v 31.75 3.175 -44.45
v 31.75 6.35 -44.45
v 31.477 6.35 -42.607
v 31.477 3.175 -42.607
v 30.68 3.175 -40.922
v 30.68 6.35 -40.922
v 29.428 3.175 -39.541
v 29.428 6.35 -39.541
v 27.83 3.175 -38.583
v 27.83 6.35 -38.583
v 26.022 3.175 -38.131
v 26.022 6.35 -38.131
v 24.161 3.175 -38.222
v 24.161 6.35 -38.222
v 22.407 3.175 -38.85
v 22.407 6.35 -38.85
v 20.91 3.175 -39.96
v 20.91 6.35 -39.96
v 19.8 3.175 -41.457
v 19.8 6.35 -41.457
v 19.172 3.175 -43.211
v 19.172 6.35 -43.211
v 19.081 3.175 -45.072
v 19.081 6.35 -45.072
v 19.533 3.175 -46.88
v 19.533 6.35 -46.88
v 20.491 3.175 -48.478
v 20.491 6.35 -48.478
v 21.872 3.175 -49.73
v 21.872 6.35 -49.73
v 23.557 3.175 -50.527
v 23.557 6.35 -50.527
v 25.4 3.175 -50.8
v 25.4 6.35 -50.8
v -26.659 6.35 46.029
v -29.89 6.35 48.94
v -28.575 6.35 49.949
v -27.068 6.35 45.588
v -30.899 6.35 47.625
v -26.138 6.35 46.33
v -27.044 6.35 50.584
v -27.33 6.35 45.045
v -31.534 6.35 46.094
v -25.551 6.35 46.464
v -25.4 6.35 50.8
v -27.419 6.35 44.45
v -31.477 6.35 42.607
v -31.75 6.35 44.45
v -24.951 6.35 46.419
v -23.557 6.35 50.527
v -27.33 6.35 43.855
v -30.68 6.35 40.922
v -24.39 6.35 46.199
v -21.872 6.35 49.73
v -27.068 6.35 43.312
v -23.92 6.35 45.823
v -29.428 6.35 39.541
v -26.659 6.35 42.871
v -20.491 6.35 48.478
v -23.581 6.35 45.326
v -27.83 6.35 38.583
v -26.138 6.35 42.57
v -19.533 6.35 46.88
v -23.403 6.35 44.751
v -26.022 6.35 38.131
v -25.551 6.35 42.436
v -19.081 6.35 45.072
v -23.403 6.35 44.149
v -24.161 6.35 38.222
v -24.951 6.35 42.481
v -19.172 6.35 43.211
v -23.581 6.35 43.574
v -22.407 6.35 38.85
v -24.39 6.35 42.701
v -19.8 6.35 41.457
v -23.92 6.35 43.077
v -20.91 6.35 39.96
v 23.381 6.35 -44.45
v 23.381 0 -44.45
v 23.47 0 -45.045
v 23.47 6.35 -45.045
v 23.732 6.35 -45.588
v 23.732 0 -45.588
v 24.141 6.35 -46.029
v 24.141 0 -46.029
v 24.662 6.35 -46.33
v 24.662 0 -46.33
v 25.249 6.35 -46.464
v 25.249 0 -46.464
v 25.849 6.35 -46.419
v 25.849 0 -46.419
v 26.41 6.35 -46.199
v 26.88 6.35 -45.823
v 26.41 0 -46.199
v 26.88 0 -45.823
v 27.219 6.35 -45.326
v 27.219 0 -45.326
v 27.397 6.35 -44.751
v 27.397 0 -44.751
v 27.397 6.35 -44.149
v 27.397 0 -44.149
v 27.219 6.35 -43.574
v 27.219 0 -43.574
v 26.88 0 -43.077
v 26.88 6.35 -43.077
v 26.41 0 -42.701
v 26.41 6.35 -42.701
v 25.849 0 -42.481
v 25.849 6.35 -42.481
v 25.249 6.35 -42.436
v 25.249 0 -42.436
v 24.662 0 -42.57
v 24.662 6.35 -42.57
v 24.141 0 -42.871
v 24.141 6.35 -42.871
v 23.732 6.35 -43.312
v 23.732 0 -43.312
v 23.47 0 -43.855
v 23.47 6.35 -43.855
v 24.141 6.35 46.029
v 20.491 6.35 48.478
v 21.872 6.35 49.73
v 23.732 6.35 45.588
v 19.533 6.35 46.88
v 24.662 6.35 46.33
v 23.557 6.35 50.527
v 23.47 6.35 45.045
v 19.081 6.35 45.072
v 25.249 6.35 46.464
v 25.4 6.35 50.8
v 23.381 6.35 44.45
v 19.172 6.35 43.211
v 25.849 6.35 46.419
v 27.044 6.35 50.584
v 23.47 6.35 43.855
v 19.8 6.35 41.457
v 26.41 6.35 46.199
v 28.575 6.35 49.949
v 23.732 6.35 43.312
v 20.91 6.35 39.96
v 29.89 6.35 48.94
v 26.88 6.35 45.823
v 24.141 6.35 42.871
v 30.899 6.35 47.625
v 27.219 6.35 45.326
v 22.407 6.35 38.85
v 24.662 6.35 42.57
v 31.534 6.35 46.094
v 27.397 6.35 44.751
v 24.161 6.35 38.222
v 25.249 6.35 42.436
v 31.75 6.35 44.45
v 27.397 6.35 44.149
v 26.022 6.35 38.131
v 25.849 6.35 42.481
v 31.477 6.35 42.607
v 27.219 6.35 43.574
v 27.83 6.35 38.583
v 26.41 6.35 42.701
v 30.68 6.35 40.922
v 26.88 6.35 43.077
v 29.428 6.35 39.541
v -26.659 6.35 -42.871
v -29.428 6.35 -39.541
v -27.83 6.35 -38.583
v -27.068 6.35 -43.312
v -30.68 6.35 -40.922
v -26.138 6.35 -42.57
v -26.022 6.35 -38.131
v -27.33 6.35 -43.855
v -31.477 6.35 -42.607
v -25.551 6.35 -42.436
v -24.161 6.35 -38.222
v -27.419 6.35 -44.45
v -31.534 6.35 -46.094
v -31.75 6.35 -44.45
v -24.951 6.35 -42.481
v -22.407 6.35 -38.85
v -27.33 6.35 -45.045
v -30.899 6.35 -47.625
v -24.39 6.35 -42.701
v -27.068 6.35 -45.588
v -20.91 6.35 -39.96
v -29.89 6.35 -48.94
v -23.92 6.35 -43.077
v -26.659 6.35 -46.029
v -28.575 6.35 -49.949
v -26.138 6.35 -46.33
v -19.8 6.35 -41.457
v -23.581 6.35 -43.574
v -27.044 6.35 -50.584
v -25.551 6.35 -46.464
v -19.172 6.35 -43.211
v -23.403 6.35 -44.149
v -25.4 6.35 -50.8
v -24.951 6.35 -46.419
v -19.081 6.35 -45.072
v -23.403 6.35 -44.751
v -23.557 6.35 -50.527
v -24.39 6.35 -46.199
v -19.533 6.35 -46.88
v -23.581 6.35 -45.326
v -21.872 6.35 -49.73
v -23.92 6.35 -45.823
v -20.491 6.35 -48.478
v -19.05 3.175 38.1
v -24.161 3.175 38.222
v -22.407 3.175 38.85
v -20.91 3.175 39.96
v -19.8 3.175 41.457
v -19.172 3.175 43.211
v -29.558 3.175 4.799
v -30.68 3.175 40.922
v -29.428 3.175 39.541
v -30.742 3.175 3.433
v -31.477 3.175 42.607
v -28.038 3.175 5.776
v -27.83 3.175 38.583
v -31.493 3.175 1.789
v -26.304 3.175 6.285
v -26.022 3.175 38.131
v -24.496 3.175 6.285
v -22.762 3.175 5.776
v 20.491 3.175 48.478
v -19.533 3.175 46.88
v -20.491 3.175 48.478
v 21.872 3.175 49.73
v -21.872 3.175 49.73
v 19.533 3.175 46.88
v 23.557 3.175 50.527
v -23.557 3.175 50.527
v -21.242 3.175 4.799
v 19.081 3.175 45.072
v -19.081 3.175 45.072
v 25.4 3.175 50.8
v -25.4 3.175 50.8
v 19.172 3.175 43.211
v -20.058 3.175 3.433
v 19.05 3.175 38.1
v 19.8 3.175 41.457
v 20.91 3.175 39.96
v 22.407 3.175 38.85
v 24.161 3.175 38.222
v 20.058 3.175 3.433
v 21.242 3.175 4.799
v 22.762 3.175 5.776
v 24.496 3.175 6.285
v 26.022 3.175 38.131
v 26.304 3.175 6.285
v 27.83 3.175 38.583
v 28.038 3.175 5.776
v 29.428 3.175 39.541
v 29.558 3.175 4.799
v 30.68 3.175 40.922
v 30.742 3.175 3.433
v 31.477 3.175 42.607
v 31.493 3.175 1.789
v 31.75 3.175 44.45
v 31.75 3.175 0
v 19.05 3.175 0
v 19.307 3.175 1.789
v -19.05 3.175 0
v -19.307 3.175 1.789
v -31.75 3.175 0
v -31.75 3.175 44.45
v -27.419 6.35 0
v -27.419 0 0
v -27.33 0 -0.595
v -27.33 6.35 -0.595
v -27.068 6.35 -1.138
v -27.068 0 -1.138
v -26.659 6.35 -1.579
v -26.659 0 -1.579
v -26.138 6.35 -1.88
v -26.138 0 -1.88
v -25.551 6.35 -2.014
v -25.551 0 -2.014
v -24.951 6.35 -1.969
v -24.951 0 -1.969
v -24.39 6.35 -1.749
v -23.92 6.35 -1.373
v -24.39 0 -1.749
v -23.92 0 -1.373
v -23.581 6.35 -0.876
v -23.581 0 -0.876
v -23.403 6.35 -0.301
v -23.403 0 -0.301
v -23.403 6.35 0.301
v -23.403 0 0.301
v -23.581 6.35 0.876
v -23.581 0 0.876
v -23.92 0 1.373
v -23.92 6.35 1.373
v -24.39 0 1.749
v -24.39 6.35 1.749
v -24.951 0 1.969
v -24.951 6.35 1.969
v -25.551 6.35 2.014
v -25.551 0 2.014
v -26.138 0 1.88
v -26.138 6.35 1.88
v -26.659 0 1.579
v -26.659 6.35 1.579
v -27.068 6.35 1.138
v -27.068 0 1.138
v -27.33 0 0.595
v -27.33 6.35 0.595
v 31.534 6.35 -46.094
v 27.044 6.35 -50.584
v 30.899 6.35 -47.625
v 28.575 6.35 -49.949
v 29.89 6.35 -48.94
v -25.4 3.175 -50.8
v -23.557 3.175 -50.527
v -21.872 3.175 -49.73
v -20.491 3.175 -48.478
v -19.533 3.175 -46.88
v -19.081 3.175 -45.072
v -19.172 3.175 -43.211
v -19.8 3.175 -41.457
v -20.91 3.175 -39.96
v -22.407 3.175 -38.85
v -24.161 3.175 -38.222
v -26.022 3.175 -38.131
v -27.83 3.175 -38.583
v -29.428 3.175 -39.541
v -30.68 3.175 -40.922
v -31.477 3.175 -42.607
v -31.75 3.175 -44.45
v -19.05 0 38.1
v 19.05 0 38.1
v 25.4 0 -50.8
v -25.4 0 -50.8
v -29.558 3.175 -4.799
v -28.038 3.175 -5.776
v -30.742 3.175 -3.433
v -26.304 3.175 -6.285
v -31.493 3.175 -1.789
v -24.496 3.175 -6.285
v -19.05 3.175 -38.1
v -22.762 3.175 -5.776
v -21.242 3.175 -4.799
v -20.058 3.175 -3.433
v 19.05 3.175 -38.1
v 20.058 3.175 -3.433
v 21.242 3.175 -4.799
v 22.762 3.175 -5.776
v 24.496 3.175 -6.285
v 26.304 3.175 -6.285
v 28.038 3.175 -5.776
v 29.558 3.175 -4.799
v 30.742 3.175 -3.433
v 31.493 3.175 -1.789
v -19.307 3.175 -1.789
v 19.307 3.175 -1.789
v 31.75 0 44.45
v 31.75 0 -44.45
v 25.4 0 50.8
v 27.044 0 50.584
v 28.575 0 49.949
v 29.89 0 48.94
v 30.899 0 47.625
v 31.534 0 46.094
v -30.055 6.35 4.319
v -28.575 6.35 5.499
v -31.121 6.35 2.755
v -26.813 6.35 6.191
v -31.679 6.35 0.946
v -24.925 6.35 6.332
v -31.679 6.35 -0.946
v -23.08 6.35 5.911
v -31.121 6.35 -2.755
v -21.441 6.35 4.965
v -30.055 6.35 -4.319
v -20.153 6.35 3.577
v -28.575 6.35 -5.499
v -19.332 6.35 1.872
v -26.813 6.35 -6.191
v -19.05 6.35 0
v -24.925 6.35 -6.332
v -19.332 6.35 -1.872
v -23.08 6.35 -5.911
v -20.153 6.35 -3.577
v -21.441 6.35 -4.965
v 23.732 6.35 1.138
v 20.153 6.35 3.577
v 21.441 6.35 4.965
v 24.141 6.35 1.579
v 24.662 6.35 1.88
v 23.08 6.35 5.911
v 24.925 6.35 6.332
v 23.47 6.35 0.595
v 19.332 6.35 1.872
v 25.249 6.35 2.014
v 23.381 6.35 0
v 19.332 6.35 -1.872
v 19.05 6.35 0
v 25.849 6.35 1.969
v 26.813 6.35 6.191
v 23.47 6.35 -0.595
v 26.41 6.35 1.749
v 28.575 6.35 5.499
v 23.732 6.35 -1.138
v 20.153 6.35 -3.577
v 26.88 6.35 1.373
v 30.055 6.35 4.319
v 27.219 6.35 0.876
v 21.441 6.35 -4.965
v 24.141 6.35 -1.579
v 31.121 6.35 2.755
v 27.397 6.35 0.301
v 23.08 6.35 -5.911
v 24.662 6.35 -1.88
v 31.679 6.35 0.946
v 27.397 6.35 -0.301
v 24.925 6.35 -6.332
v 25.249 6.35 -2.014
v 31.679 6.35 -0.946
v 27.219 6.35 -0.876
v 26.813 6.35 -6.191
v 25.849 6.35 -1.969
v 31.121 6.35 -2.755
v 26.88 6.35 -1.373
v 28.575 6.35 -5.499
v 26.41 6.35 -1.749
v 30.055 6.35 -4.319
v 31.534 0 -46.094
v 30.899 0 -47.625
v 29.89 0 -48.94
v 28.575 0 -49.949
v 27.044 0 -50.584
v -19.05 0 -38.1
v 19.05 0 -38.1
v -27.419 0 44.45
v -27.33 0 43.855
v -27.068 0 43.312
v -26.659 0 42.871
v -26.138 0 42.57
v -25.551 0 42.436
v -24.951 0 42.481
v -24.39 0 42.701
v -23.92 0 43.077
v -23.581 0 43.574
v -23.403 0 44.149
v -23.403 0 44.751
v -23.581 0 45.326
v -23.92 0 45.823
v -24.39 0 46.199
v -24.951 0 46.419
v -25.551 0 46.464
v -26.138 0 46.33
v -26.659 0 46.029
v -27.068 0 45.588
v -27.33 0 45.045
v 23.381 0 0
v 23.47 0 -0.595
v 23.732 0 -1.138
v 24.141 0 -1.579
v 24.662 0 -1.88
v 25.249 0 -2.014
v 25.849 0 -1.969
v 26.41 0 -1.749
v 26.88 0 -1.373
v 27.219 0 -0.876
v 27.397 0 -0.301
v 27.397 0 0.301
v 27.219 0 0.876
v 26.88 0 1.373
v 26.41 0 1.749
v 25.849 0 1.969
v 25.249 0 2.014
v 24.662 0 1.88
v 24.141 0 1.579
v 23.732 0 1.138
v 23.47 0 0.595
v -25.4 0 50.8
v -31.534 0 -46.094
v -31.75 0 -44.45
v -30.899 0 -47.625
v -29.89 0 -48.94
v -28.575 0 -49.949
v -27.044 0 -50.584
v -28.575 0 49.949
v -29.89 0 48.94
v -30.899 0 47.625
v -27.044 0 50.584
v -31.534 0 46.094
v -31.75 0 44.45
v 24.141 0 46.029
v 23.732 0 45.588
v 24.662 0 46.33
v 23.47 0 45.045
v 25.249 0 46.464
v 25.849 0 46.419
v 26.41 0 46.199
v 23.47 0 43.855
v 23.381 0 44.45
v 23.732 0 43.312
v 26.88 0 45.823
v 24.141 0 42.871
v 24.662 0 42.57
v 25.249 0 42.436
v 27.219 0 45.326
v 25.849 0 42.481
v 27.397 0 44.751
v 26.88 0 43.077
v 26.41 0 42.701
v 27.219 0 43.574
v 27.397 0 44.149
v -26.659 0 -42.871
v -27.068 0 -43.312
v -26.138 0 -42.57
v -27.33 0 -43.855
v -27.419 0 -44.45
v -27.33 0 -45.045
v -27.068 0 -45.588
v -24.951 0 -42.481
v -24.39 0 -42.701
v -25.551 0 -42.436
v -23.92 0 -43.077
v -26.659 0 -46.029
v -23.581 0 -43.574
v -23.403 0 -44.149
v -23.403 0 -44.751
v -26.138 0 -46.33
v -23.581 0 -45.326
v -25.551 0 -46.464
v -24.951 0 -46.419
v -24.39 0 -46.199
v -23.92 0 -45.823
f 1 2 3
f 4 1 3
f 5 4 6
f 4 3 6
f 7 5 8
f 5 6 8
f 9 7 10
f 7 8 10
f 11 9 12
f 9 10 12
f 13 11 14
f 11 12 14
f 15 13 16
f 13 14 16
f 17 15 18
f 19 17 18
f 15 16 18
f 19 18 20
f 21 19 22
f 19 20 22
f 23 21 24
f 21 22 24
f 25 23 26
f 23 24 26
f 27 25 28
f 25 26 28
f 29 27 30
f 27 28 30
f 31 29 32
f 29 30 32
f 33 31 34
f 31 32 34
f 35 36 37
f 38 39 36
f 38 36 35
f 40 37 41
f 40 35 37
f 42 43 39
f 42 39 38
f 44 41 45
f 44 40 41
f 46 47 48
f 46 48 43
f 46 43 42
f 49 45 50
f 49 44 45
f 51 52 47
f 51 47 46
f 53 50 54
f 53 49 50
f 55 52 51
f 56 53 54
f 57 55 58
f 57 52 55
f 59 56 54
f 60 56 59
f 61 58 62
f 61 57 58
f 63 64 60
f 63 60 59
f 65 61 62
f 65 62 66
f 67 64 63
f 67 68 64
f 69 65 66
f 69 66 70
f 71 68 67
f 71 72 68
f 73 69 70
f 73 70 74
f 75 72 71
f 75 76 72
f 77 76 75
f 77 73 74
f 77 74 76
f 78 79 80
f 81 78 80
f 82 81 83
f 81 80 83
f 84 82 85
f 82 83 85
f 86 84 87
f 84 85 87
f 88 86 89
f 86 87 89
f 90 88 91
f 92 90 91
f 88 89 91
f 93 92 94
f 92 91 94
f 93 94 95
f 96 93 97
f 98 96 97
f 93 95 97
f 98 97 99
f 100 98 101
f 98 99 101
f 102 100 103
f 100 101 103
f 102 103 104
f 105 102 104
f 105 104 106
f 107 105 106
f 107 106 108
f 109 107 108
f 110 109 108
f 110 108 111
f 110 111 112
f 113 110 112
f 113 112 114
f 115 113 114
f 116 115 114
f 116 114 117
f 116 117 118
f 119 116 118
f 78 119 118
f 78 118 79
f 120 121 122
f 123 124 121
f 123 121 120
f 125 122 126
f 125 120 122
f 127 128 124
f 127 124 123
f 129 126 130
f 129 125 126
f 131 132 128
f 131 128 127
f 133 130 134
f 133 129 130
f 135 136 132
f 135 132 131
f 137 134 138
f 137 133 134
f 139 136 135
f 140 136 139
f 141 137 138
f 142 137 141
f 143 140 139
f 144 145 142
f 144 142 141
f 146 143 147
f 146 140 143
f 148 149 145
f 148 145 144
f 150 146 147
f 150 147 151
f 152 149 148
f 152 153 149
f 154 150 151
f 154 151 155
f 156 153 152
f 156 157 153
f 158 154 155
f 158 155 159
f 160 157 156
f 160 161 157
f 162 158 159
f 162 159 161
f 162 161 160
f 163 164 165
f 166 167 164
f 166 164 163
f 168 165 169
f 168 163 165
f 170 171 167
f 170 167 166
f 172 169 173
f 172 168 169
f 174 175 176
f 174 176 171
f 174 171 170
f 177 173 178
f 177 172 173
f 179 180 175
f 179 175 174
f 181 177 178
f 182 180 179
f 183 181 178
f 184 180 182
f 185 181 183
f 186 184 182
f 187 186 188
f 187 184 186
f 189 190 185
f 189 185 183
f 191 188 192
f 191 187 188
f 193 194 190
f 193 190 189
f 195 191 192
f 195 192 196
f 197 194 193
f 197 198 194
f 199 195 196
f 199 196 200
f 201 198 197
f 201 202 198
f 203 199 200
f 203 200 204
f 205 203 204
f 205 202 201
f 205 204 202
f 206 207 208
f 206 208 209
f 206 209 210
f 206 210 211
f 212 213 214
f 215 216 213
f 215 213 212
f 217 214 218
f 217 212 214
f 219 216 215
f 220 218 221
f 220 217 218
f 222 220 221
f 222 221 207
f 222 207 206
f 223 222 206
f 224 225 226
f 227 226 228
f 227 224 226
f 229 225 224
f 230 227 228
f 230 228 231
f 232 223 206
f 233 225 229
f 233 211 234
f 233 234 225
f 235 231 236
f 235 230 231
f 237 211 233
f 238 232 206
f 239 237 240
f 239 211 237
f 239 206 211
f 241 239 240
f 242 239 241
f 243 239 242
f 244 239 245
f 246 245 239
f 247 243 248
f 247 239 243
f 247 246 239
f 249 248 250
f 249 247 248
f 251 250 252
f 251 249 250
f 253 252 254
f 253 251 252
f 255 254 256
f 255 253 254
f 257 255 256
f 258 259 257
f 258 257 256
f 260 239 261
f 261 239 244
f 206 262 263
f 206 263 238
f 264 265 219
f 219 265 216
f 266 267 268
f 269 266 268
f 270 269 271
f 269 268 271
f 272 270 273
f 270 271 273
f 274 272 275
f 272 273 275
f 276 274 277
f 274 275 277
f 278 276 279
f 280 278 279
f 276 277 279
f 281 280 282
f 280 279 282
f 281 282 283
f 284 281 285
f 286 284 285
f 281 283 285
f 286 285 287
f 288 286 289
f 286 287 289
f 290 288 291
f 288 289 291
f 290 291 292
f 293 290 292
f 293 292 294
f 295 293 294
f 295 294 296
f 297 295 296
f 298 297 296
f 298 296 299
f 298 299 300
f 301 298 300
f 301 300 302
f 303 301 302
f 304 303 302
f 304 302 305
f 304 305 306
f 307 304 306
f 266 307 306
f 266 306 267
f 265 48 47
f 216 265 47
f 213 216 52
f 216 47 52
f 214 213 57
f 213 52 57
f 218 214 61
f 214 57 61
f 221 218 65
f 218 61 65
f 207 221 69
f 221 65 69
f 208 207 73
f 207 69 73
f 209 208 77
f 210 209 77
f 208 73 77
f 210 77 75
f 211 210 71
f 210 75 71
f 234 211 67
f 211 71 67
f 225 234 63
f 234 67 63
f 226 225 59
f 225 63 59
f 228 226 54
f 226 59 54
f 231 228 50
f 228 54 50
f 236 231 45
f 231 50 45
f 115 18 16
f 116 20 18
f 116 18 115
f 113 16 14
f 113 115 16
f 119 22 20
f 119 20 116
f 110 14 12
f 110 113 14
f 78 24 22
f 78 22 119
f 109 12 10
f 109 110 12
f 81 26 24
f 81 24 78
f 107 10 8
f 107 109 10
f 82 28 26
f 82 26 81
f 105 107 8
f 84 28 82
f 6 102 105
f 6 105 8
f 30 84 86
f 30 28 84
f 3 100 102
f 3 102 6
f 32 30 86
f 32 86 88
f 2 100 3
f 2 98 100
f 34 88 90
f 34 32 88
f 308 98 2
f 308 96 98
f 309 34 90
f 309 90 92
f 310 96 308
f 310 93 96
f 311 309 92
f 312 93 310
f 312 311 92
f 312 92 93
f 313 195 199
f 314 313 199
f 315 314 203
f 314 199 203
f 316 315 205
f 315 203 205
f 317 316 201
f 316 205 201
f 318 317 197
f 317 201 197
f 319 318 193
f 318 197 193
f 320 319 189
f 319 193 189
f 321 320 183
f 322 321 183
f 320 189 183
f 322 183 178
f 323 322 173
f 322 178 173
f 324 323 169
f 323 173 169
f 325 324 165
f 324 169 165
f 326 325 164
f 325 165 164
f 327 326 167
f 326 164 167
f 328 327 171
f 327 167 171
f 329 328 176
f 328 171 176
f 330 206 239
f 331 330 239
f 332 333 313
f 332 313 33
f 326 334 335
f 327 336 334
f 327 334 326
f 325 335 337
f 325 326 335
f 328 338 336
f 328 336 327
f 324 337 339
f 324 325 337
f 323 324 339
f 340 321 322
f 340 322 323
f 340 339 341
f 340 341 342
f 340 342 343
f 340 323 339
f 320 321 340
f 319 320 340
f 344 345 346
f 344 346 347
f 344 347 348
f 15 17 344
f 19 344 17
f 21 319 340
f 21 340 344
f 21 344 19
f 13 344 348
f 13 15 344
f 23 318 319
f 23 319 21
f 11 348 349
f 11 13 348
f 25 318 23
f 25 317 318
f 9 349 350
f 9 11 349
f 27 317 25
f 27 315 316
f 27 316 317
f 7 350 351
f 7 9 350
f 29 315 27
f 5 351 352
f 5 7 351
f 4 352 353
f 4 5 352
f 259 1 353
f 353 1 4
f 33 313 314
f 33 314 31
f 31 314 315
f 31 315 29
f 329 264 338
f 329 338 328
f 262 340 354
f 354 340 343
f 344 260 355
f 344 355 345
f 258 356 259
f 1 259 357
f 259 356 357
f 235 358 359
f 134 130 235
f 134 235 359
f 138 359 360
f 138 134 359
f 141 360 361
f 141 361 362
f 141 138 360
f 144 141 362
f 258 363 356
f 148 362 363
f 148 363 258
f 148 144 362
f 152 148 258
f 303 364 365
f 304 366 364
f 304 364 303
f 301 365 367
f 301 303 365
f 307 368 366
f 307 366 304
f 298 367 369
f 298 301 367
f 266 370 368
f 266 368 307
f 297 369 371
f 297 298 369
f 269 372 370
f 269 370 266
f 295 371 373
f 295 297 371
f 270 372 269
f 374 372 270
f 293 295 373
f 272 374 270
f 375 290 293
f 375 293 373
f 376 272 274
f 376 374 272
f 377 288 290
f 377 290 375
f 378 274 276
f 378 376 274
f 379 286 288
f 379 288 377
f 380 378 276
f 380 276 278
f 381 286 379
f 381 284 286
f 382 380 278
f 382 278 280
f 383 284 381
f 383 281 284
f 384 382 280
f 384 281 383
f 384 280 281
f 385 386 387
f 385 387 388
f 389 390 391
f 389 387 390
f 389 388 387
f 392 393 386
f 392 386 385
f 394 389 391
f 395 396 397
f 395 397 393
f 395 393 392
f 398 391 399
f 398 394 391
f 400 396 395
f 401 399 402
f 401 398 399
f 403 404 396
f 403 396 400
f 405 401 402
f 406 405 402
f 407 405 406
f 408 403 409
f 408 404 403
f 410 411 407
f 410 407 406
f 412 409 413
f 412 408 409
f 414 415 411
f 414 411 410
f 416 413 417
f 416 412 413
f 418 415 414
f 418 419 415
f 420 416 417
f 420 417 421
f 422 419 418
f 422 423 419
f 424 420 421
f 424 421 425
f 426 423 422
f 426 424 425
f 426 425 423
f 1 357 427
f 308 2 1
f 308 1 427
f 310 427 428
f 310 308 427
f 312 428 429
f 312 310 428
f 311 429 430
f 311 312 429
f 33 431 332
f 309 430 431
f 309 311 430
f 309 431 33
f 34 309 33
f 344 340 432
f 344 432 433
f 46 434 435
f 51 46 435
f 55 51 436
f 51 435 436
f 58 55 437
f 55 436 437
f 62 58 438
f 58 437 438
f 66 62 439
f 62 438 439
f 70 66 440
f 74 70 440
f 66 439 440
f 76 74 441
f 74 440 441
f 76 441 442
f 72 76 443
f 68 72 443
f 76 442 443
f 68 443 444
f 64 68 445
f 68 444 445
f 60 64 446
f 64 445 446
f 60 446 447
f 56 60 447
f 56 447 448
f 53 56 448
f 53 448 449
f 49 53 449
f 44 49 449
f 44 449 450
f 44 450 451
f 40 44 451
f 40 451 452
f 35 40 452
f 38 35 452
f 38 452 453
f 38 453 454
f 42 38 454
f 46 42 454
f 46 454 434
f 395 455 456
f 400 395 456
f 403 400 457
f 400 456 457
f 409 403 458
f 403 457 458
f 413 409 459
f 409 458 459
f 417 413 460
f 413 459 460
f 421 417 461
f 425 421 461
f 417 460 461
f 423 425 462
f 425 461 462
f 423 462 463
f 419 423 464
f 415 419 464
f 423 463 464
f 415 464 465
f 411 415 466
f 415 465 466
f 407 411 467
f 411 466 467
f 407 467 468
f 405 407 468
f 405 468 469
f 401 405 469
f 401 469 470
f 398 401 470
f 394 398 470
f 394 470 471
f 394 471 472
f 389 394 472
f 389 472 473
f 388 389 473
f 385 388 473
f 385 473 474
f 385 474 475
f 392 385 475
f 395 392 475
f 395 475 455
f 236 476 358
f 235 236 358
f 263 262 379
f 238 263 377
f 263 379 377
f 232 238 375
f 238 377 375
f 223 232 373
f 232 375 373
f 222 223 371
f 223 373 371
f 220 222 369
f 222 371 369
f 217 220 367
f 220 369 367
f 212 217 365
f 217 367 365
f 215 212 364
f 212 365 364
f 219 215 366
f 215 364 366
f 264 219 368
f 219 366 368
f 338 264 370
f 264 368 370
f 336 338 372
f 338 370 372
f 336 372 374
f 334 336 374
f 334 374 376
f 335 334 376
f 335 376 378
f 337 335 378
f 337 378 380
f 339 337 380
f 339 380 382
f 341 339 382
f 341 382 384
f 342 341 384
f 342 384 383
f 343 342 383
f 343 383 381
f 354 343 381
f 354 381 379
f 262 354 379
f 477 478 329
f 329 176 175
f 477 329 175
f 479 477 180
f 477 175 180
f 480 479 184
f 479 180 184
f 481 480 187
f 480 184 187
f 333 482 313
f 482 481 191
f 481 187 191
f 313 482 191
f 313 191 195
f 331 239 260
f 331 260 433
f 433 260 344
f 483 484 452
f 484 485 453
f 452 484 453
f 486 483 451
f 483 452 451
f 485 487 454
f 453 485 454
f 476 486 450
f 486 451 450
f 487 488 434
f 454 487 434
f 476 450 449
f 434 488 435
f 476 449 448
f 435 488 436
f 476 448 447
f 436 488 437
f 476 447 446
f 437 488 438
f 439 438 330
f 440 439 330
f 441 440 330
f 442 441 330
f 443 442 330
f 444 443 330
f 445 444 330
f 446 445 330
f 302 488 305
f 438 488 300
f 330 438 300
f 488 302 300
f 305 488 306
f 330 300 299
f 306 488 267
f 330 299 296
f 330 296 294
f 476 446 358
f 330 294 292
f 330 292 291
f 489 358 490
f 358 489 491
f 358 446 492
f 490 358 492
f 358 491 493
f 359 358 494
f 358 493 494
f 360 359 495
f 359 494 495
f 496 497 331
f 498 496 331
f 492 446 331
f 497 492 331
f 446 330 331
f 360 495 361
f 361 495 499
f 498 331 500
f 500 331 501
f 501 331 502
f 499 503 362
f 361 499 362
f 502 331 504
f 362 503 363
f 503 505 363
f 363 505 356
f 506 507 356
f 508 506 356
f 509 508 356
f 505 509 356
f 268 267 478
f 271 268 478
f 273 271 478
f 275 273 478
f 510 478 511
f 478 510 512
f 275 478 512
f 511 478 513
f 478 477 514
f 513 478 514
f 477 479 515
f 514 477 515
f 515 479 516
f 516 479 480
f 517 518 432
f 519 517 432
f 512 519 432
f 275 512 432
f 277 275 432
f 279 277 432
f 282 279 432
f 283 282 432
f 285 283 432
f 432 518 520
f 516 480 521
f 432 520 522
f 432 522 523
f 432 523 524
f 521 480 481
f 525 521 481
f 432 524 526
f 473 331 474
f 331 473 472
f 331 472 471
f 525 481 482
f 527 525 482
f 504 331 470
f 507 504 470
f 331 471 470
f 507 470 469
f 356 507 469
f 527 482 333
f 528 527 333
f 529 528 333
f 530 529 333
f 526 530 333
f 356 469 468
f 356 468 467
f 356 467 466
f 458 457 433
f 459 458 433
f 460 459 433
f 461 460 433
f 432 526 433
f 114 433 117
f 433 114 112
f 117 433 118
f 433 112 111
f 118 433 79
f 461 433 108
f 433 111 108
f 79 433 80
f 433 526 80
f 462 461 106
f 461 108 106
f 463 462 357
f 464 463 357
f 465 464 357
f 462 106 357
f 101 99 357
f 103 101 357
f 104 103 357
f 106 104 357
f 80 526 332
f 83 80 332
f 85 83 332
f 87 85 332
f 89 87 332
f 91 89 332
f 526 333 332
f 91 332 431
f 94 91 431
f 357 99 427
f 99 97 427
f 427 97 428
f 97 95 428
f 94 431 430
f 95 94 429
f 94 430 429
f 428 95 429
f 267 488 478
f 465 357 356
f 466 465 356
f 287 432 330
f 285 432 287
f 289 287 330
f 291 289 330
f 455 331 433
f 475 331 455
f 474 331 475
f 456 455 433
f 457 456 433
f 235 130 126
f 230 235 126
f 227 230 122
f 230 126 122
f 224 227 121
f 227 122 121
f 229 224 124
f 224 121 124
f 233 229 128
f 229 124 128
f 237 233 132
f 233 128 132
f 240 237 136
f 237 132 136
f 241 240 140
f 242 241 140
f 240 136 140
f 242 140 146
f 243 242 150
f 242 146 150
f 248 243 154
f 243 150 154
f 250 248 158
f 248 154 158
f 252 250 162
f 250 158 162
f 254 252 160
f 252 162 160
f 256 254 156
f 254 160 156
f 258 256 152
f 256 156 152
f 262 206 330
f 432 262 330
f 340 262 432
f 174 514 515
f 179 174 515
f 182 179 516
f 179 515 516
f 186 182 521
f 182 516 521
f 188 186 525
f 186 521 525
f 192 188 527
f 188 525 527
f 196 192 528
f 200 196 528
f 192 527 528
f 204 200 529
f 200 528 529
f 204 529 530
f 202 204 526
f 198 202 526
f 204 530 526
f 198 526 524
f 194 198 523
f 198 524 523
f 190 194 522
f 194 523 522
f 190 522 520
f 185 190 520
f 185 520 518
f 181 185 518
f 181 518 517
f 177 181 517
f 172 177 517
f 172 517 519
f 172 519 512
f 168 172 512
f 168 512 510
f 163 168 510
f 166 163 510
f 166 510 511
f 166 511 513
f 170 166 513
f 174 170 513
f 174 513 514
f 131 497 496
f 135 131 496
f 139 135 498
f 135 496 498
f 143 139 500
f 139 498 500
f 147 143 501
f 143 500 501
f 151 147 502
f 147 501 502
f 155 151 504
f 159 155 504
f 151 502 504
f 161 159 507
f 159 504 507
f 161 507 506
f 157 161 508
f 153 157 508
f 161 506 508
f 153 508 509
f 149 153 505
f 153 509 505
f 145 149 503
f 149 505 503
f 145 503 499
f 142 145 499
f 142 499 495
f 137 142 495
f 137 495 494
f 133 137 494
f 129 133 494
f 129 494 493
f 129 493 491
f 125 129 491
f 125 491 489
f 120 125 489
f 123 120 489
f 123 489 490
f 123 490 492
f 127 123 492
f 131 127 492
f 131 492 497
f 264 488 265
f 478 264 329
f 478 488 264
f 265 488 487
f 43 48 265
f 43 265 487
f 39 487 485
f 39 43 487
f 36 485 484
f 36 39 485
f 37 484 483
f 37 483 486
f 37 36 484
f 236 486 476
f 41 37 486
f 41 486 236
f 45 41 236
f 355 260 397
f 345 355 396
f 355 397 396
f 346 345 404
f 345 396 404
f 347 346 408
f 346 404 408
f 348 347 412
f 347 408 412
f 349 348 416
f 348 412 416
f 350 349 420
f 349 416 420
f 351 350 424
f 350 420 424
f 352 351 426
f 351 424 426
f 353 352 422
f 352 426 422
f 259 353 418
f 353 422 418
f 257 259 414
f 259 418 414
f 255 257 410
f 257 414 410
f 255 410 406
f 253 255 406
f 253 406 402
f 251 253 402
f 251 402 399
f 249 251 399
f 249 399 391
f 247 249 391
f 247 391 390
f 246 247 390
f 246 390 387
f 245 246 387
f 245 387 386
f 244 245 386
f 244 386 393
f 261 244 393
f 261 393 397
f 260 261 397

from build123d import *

# Parameters (mm, degrees)
SKETCH1_W              = 63.5
SKETCH1_H              = 101.6
BOSS_EXTRUDE1_DEPTH    = 6.35
FILLET1_R              = 6.35
F_10_32_TAPPED_HOLE1_D = 4.0386
SKETCH10_W             = 38.1
SKETCH10_H             = 76.2
CUT_EXTRUDE1_DEPTH     = 7.35
CUT_EXTRUDE2_DEPTH     = 3.175


with BuildPart() as part:
    # Sketch1 → Boss-Extrude1 (new body)
    with BuildSketch(Plane(origin=(0, 0, 0), x_dir=(1, 0, 0), z_dir=(0, 1, 0))):
        Rectangle(SKETCH1_W, SKETCH1_H)
    extrude(amount=BOSS_EXTRUDE1_DEPTH)

    # Fillet1
    fillet1_edges = [part.edges().sort_by_distance(p)[0] for p in [
        (-31.75, 3.175, -50.8),
        (31.75, 3.175, -50.8),
        (31.75, 3.175, 50.8),
        (-31.75, 3.175, 50.8),
    ]]
    fillet(fillet1_edges, radius=FILLET1_R)

    # #10-32 Tapped Hole1 (through all)
    with Locations(Plane(origin=(0, 6.35, 0), x_dir=(1, 0, 0), z_dir=(0, 1, 0))):
        with Locations((25.4, 44.45), (-25.4, 44.45), (-25.4, -44.45), (25.4, -44.45), (-25.4, 0), (25.4, 0)):
            Hole(F_10_32_TAPPED_HOLE1_D / 2)

    # Sketch10 → Cut-Extrude1 (cut, through all)
    with BuildSketch(Plane(origin=(0, 6.35, 0), x_dir=(1, 0, 0), z_dir=(0, 1, 0))):
        Rectangle(SKETCH10_W, SKETCH10_H)
    extrude(amount=-CUT_EXTRUDE1_DEPTH, mode=Mode.SUBTRACT)

    # Sketch11 → Cut-Extrude2 (cut)
    with BuildSketch(Plane(origin=(0, 6.35, 0), x_dir=(1, 0, 0), z_dir=(0, 1, 0))):
        with BuildLine():
            ThreePointArc((25.4, -50.8), (20.909871939, -39.959871939), (31.75, -44.45))
            Line((31.75, -44.45), (31.75, 0))
            ThreePointArc((31.75, 0), (25.4, -6.35), (19.05, 0))
            Line((19.05, 0), (19.05, -38.1))
            Line((19.05, -38.1), (-19.05, -38.1))
            Line((-19.05, -38.1), (-19.05, 0))
            ThreePointArc((-19.05, 0), (-25.4, -6.35), (-31.75, 0))
            Line((-31.75, 0), (-31.75, -44.45))
            ThreePointArc((-31.75, -44.45), (-20.909871939, -39.959871939), (-25.4, -50.8))
            Line((-25.4, -50.8), (25.4, -50.8))
        make_face()
        with BuildLine():
            ThreePointArc((19.05, 0), (25.4, 6.35), (31.75, 0))
            Line((31.75, 0), (31.75, 44.45))
            ThreePointArc((31.75, 44.45), (20.909871939, 39.959871939), (25.4, 50.8))
            Line((25.4, 50.8), (-25.4, 50.8))
            ThreePointArc((-25.4, 50.8), (-20.909871939, 39.959871939), (-31.75, 44.45))
            Line((-31.75, 44.45), (-31.75, 0))
            ThreePointArc((-31.75, 0), (-25.4, 6.35), (-19.05, 0))
            Line((-19.05, 0), (-19.05, 38.1))
            Line((-19.05, 38.1), (19.05, 38.1))
            Line((19.05, 38.1), (19.05, 0))
        make_face()
    extrude(amount=-CUT_EXTRUDE2_DEPTH, mode=Mode.SUBTRACT)


solid = part.part
